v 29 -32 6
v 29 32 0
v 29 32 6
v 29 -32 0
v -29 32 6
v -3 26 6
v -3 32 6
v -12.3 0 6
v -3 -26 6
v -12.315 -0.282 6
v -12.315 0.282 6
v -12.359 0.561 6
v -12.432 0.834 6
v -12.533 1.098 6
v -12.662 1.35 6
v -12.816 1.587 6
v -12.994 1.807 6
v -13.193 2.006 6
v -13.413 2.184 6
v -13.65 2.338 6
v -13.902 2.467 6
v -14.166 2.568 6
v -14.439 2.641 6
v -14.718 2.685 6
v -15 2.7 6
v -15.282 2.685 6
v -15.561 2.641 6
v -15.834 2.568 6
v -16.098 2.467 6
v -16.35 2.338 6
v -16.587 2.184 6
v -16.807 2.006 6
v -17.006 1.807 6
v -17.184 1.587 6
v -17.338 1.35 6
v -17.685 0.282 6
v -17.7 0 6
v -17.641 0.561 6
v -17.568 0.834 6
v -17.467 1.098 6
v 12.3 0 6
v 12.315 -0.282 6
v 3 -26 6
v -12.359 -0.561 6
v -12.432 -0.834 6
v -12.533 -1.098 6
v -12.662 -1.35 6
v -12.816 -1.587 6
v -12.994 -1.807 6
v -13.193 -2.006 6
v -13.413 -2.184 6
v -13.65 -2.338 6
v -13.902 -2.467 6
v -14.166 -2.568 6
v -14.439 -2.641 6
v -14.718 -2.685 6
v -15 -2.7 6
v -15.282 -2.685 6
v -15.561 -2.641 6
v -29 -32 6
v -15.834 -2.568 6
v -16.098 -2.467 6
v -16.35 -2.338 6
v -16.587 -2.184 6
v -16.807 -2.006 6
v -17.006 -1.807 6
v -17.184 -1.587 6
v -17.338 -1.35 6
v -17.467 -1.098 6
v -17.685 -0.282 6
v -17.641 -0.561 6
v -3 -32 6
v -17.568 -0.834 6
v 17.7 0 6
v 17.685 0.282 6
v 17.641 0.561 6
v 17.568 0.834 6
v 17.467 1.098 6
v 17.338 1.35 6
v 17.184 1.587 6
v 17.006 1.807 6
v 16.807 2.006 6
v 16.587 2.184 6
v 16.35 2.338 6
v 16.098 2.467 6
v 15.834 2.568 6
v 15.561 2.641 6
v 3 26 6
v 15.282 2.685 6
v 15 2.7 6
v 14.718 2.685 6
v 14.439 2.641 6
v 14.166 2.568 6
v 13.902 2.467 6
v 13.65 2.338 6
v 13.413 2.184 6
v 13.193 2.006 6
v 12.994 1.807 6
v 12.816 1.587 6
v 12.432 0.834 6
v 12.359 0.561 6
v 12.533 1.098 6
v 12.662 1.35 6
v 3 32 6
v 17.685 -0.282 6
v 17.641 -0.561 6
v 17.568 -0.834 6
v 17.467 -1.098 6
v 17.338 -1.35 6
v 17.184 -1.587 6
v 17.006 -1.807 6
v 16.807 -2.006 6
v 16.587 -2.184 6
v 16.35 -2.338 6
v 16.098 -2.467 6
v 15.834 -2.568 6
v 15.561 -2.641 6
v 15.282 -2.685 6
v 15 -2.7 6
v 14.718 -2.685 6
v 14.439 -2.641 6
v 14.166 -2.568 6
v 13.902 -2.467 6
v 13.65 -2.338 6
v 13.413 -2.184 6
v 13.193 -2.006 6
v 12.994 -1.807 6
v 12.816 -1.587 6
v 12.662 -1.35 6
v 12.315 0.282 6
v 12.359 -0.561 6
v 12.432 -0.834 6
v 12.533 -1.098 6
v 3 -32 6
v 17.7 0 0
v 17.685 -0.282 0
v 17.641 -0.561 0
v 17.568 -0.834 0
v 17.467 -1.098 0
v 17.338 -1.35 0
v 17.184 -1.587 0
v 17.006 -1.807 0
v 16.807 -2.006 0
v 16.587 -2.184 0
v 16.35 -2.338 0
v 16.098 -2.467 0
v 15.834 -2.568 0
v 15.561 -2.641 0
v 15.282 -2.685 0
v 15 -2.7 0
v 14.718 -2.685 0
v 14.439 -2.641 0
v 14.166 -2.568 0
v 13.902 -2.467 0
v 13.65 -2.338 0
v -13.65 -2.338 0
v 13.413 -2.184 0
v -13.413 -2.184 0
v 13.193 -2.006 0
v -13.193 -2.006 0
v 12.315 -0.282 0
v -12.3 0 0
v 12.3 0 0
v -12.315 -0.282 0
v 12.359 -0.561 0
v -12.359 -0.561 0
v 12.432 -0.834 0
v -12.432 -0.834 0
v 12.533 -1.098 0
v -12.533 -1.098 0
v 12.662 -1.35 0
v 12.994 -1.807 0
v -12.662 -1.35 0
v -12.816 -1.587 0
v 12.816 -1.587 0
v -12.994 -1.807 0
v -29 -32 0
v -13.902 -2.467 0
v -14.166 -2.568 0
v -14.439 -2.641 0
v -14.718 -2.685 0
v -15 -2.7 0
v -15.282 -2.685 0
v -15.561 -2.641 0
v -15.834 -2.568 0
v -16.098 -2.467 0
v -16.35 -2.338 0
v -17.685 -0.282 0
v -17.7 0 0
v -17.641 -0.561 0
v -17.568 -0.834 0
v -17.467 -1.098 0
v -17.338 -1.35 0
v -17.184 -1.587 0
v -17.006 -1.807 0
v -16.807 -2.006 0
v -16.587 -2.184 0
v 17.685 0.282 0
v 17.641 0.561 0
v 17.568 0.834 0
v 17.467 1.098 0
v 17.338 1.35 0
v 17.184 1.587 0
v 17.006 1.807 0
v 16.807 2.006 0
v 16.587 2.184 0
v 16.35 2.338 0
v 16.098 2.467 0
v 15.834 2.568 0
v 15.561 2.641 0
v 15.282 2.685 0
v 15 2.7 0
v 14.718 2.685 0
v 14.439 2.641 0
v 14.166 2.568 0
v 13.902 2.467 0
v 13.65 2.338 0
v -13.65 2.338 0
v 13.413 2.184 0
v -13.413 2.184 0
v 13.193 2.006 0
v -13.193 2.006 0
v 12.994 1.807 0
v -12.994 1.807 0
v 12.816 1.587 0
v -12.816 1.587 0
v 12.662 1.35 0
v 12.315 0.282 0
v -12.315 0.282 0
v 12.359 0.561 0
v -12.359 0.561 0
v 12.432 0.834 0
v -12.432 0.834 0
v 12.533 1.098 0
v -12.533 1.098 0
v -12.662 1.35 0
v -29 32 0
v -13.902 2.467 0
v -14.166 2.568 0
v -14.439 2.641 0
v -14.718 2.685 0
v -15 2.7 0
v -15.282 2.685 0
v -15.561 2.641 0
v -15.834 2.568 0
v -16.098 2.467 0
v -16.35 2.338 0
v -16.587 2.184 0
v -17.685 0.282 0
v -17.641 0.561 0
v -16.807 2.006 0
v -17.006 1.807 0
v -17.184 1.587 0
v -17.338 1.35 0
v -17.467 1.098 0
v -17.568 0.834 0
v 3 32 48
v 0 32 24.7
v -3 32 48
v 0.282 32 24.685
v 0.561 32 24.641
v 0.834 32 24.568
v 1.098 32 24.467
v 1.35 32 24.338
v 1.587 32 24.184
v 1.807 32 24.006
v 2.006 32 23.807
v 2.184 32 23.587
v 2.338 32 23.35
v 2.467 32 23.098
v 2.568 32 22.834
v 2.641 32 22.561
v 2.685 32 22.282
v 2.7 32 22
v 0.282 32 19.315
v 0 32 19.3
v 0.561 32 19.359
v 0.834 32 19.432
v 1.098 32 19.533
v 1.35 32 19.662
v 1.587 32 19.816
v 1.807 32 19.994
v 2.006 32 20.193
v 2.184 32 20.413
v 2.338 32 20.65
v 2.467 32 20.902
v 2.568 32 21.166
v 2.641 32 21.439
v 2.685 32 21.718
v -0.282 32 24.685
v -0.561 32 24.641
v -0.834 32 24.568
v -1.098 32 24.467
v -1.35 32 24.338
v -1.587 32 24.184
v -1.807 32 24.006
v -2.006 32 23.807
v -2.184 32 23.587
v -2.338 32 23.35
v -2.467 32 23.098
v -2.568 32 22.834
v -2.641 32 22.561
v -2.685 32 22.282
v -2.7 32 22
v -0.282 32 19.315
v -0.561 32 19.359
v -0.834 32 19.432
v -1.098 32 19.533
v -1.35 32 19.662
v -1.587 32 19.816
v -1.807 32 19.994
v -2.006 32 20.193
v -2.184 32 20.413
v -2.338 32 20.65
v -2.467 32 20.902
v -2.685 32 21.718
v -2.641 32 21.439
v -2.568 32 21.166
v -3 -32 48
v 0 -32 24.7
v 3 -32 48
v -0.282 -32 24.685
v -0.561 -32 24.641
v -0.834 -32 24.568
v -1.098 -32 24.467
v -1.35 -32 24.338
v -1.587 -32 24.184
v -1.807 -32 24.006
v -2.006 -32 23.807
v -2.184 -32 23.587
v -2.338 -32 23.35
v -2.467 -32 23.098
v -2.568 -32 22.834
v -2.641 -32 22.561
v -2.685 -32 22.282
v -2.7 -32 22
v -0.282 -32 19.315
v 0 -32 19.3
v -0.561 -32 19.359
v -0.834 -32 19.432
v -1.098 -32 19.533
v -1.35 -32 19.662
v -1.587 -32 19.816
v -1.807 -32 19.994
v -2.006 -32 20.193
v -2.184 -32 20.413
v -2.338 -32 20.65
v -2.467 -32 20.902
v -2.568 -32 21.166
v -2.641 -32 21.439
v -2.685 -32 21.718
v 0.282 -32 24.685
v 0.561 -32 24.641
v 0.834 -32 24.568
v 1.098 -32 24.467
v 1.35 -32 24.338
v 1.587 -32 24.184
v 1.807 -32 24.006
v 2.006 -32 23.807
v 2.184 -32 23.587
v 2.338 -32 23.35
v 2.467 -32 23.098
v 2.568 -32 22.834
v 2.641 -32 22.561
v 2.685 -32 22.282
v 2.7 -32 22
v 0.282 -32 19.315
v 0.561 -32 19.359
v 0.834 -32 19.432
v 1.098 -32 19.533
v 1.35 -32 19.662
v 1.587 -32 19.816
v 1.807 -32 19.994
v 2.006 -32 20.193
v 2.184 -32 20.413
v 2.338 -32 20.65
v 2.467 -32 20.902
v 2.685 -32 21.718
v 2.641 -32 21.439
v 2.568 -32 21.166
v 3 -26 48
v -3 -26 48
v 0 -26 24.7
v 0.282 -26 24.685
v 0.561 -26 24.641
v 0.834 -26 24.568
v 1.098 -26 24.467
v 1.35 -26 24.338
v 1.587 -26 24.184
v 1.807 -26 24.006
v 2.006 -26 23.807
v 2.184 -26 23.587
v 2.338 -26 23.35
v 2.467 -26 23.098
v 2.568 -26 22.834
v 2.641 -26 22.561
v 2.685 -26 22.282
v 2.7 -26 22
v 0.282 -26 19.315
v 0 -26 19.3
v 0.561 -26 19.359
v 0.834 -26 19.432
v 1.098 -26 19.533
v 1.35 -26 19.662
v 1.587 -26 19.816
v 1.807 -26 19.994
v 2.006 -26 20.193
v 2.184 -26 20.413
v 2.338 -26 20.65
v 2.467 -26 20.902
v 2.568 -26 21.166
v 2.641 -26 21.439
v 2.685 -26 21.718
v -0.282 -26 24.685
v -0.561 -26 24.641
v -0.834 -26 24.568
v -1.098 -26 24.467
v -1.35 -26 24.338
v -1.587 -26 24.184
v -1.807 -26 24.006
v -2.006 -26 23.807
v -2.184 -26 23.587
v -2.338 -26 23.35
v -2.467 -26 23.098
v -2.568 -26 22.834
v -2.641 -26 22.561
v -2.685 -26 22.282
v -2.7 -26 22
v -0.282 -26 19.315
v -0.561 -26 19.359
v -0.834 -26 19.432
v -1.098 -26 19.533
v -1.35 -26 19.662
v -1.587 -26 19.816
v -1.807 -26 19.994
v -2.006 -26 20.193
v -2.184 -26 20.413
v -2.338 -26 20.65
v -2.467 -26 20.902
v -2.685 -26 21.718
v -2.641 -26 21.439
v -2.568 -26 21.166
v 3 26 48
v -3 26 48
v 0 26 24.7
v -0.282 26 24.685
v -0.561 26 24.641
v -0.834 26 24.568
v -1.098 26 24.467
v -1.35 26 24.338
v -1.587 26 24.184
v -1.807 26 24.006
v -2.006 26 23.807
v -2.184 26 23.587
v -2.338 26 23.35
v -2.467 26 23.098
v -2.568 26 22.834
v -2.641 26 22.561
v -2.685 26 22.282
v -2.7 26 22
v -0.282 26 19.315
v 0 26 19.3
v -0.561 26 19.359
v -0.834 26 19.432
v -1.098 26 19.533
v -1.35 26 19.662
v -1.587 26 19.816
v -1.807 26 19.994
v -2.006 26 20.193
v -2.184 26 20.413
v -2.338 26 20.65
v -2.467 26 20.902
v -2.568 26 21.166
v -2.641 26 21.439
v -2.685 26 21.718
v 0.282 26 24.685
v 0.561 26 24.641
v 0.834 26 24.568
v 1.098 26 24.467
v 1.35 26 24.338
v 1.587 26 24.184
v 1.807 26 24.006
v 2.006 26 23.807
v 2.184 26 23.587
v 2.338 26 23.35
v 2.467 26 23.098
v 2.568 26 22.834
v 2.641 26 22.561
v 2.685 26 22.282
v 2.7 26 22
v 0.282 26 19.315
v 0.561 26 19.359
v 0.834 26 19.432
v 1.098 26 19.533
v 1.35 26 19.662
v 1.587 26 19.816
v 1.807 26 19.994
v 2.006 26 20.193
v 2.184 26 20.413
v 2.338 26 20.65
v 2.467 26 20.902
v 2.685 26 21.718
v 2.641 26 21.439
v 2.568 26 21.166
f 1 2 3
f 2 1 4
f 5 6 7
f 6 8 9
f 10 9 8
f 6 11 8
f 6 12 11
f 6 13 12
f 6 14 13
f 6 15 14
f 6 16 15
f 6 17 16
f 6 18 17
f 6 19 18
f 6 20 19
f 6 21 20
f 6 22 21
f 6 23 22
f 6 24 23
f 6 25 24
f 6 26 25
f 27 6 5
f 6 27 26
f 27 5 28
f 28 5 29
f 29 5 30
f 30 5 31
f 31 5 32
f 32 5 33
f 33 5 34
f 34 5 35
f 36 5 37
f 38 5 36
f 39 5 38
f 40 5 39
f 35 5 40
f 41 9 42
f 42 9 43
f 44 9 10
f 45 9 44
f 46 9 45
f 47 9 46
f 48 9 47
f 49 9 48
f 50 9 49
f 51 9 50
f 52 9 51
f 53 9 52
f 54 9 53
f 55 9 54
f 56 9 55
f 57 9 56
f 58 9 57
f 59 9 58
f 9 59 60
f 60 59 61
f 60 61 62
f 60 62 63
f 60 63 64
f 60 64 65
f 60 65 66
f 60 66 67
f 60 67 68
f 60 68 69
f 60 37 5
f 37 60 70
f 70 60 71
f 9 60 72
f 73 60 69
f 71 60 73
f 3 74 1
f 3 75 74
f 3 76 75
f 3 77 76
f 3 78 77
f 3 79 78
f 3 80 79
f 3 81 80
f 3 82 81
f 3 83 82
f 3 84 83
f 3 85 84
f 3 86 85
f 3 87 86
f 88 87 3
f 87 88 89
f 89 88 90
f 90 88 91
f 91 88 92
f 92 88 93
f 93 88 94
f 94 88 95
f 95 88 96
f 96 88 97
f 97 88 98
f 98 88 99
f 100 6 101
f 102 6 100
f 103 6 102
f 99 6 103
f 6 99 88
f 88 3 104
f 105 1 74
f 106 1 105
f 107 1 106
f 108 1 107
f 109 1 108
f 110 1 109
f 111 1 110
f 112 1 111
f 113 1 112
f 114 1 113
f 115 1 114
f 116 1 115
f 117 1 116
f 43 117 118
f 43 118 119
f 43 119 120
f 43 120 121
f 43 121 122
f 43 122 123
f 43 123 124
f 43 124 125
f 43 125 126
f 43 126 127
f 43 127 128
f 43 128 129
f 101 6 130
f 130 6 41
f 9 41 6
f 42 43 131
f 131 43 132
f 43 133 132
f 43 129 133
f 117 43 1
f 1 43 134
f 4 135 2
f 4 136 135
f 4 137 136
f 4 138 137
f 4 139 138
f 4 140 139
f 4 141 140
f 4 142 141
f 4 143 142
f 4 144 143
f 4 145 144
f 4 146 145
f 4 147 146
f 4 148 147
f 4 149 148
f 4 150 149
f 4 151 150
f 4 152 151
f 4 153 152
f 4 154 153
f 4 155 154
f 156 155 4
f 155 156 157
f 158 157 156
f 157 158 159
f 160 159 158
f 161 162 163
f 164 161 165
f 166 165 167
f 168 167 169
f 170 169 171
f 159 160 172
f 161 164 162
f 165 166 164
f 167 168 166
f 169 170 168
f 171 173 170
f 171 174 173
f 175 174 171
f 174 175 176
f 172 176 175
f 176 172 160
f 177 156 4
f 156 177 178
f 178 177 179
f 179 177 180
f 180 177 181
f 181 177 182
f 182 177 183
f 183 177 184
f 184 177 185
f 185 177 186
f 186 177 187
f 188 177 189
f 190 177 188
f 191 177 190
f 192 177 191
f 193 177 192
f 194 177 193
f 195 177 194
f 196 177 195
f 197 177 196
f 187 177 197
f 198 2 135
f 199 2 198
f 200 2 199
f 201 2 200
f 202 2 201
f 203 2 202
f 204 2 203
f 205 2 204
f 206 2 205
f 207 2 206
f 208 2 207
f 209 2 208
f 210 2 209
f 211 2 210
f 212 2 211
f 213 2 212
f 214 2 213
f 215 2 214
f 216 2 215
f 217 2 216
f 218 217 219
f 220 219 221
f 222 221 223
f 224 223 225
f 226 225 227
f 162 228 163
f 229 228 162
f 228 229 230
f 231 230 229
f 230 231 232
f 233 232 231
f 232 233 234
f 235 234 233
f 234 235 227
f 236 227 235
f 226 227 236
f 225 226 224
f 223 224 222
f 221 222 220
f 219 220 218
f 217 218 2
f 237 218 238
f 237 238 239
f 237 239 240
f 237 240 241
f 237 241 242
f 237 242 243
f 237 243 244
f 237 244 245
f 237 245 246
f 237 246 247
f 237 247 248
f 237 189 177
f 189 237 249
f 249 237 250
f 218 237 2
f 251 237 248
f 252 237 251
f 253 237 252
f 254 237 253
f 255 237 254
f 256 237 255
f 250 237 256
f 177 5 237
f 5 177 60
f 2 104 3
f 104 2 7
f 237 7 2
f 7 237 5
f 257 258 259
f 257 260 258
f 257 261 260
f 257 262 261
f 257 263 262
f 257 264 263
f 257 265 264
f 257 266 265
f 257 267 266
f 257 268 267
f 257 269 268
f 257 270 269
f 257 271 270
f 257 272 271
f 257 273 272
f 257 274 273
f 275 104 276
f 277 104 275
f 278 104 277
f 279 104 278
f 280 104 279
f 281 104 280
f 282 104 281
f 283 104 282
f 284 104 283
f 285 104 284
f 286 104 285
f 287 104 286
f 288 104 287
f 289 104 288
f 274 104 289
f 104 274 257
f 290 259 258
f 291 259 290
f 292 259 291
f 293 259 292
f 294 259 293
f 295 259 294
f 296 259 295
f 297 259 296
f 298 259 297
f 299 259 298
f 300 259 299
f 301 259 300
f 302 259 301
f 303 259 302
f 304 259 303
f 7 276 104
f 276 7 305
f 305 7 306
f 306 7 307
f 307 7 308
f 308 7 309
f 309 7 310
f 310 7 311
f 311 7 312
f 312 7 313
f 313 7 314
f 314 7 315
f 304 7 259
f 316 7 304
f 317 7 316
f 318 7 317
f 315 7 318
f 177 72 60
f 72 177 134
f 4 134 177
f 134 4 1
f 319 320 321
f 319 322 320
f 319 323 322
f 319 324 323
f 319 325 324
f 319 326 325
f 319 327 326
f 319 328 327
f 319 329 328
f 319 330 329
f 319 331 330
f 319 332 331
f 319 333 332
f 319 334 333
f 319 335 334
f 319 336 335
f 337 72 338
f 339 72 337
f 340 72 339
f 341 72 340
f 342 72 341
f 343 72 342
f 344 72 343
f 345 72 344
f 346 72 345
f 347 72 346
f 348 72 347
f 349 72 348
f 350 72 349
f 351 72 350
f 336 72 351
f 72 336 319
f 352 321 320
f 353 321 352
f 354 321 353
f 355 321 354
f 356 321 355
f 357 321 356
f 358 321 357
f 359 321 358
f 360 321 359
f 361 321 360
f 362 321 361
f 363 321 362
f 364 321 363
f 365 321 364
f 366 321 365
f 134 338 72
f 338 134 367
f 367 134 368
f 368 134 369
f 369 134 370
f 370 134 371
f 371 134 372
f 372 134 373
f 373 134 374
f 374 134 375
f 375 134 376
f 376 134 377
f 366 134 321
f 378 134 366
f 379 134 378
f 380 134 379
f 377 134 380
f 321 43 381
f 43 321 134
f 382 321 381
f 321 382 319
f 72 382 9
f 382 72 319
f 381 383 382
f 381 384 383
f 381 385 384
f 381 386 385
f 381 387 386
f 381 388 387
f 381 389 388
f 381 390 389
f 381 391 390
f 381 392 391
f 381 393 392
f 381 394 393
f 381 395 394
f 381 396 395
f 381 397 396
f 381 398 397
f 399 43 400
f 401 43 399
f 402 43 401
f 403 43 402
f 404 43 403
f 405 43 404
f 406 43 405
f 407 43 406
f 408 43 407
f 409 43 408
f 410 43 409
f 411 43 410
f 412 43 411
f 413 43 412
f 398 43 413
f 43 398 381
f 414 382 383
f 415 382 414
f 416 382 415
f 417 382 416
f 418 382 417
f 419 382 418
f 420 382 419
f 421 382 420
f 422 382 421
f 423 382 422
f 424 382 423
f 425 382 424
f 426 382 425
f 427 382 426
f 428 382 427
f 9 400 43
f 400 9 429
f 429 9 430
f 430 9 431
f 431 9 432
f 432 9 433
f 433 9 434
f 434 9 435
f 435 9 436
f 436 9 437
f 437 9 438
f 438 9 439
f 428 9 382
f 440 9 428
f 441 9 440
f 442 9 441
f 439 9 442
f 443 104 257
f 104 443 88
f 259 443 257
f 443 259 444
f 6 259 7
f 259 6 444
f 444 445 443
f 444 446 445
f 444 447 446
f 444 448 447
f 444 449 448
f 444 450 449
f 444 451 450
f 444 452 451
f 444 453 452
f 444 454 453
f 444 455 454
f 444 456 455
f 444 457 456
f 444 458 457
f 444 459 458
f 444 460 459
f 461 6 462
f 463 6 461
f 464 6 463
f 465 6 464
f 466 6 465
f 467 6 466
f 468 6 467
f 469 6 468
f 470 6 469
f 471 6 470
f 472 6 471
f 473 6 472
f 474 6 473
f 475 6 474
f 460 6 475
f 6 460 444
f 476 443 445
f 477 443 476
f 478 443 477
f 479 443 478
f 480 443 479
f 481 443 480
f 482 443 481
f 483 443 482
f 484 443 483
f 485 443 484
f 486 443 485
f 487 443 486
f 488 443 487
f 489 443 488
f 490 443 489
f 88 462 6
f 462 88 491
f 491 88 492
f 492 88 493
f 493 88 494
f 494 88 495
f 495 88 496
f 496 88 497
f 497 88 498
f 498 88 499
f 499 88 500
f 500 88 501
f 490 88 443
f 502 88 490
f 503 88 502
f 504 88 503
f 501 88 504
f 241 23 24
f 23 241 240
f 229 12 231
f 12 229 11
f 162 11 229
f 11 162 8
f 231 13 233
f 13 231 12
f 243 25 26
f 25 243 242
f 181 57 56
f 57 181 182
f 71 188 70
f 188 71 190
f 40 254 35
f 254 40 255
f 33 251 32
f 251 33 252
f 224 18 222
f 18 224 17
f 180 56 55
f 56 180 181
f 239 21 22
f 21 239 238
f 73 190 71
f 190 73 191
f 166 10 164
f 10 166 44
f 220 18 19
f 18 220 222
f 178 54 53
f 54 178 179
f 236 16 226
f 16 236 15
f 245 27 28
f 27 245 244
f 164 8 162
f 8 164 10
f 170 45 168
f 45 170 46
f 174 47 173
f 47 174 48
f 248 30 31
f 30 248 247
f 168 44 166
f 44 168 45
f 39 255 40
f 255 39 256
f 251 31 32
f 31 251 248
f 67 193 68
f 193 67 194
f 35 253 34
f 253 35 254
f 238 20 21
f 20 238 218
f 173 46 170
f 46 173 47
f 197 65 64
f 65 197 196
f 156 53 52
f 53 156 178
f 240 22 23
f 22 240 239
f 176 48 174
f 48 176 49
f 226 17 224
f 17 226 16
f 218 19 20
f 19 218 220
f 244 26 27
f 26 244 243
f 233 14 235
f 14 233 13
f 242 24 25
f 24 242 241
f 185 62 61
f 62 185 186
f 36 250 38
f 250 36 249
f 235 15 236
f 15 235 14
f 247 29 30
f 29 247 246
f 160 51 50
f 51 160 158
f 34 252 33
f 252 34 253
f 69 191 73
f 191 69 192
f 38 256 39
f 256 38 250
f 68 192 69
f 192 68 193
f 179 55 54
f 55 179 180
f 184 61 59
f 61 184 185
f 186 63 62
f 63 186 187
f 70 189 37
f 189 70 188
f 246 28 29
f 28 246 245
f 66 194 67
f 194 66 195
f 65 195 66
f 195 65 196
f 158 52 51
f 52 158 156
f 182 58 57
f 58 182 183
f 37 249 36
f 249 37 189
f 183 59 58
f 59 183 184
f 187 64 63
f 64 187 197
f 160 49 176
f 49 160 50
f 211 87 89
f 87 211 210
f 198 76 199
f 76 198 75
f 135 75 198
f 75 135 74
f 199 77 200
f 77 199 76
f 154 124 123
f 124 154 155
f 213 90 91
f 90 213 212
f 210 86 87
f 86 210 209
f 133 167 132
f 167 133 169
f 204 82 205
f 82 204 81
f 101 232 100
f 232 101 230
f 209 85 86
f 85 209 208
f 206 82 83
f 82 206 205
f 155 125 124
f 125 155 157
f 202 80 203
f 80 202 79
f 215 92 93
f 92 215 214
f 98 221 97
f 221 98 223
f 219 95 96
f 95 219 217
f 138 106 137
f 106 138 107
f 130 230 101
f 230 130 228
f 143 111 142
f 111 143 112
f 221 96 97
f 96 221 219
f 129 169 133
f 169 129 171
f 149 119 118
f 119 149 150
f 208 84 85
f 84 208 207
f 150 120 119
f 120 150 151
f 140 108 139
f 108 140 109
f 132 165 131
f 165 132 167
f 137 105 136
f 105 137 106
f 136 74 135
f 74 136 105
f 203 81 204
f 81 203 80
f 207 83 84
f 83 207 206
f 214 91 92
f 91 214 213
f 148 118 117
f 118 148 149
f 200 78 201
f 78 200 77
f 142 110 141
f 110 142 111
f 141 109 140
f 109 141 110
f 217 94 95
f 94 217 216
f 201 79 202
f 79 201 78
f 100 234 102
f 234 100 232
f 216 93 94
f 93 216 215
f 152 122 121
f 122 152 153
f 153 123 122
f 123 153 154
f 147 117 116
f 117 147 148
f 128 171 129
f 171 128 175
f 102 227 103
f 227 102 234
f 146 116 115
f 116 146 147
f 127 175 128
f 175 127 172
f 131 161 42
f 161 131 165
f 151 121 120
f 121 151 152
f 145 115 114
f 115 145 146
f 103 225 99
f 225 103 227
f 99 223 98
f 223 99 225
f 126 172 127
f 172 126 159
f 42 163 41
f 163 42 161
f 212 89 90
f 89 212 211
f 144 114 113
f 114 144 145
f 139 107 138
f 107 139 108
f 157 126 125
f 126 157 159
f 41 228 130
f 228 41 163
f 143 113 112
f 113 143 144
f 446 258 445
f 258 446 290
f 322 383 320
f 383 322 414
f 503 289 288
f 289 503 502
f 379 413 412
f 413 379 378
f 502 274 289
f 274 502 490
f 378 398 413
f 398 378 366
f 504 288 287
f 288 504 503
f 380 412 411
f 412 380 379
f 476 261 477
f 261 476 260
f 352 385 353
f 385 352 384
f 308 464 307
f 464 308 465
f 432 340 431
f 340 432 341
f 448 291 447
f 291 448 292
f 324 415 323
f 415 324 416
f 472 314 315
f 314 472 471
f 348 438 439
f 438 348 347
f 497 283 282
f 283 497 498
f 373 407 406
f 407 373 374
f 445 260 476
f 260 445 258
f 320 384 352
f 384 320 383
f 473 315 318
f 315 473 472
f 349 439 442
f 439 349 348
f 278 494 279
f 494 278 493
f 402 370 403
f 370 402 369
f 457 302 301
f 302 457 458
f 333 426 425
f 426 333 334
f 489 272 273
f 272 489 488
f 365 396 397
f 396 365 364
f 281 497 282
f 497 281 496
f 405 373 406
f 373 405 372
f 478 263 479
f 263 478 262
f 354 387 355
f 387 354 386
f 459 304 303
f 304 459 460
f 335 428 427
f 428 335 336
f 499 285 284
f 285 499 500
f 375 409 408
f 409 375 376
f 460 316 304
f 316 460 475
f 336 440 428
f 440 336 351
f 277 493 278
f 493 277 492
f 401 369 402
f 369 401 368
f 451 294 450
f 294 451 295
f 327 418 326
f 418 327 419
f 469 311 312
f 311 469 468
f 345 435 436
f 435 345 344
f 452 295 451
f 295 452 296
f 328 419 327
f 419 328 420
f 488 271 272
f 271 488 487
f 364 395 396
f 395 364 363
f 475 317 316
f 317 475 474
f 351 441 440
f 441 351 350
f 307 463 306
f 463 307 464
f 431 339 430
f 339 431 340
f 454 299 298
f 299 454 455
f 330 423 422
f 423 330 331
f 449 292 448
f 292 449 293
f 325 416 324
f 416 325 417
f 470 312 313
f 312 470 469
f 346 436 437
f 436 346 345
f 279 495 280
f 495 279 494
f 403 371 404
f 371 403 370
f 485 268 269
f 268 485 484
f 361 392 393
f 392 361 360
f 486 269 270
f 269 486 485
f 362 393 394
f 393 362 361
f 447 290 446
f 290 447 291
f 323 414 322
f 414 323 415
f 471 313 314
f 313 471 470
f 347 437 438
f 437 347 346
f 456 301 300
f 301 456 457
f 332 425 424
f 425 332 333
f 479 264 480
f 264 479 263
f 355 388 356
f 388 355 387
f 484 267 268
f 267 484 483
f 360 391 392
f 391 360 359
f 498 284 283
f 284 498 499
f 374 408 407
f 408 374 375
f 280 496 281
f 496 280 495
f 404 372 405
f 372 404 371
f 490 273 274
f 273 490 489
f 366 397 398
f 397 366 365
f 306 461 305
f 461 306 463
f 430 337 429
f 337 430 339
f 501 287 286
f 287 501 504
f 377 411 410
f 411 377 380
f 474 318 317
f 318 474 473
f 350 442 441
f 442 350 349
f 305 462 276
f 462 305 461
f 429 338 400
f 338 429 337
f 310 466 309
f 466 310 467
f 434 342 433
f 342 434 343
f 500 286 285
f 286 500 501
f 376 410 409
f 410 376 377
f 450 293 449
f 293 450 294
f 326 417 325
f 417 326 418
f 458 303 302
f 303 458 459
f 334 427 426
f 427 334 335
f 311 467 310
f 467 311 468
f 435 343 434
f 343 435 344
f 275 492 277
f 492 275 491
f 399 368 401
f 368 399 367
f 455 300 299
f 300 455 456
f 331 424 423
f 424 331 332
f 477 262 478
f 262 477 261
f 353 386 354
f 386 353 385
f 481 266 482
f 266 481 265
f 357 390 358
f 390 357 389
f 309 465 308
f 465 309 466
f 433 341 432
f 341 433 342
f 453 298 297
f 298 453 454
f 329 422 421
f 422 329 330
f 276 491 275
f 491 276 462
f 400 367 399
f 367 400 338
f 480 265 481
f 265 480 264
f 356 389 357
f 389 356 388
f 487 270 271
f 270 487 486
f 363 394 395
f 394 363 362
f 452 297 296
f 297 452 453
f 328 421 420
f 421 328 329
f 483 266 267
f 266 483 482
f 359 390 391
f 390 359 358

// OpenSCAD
// Clevis mounting bracket for M5 pin.
$fn = 60;
eps = 0.02;
opening = 52;
ear_h = 44;
base_l = 58;
base_w = opening + 12;
base_t = 6;
ear_t = 6;
difference() {
    union() {
        translate([-base_l / 2, -base_w / 2, 0]) cube([base_l, base_w, base_t]);
        translate([-ear_t / 2, -base_w / 2, base_t - 2]) cube([ear_t, ear_t, ear_h]);
        translate([-ear_t / 2, base_w / 2 - ear_t, base_t - 2]) cube([ear_t, ear_t, ear_h]);
    }
    for (x = [-15, 15]) translate([x, 0, -eps]) cylinder(d = 5.4, h = base_t + 2 * eps);
    translate([0, -base_w / 2 - eps, ear_h / 2]) rotate([-90, 0, 0]) cylinder(d = 5.4, h = base_w + 2 * eps);
}
